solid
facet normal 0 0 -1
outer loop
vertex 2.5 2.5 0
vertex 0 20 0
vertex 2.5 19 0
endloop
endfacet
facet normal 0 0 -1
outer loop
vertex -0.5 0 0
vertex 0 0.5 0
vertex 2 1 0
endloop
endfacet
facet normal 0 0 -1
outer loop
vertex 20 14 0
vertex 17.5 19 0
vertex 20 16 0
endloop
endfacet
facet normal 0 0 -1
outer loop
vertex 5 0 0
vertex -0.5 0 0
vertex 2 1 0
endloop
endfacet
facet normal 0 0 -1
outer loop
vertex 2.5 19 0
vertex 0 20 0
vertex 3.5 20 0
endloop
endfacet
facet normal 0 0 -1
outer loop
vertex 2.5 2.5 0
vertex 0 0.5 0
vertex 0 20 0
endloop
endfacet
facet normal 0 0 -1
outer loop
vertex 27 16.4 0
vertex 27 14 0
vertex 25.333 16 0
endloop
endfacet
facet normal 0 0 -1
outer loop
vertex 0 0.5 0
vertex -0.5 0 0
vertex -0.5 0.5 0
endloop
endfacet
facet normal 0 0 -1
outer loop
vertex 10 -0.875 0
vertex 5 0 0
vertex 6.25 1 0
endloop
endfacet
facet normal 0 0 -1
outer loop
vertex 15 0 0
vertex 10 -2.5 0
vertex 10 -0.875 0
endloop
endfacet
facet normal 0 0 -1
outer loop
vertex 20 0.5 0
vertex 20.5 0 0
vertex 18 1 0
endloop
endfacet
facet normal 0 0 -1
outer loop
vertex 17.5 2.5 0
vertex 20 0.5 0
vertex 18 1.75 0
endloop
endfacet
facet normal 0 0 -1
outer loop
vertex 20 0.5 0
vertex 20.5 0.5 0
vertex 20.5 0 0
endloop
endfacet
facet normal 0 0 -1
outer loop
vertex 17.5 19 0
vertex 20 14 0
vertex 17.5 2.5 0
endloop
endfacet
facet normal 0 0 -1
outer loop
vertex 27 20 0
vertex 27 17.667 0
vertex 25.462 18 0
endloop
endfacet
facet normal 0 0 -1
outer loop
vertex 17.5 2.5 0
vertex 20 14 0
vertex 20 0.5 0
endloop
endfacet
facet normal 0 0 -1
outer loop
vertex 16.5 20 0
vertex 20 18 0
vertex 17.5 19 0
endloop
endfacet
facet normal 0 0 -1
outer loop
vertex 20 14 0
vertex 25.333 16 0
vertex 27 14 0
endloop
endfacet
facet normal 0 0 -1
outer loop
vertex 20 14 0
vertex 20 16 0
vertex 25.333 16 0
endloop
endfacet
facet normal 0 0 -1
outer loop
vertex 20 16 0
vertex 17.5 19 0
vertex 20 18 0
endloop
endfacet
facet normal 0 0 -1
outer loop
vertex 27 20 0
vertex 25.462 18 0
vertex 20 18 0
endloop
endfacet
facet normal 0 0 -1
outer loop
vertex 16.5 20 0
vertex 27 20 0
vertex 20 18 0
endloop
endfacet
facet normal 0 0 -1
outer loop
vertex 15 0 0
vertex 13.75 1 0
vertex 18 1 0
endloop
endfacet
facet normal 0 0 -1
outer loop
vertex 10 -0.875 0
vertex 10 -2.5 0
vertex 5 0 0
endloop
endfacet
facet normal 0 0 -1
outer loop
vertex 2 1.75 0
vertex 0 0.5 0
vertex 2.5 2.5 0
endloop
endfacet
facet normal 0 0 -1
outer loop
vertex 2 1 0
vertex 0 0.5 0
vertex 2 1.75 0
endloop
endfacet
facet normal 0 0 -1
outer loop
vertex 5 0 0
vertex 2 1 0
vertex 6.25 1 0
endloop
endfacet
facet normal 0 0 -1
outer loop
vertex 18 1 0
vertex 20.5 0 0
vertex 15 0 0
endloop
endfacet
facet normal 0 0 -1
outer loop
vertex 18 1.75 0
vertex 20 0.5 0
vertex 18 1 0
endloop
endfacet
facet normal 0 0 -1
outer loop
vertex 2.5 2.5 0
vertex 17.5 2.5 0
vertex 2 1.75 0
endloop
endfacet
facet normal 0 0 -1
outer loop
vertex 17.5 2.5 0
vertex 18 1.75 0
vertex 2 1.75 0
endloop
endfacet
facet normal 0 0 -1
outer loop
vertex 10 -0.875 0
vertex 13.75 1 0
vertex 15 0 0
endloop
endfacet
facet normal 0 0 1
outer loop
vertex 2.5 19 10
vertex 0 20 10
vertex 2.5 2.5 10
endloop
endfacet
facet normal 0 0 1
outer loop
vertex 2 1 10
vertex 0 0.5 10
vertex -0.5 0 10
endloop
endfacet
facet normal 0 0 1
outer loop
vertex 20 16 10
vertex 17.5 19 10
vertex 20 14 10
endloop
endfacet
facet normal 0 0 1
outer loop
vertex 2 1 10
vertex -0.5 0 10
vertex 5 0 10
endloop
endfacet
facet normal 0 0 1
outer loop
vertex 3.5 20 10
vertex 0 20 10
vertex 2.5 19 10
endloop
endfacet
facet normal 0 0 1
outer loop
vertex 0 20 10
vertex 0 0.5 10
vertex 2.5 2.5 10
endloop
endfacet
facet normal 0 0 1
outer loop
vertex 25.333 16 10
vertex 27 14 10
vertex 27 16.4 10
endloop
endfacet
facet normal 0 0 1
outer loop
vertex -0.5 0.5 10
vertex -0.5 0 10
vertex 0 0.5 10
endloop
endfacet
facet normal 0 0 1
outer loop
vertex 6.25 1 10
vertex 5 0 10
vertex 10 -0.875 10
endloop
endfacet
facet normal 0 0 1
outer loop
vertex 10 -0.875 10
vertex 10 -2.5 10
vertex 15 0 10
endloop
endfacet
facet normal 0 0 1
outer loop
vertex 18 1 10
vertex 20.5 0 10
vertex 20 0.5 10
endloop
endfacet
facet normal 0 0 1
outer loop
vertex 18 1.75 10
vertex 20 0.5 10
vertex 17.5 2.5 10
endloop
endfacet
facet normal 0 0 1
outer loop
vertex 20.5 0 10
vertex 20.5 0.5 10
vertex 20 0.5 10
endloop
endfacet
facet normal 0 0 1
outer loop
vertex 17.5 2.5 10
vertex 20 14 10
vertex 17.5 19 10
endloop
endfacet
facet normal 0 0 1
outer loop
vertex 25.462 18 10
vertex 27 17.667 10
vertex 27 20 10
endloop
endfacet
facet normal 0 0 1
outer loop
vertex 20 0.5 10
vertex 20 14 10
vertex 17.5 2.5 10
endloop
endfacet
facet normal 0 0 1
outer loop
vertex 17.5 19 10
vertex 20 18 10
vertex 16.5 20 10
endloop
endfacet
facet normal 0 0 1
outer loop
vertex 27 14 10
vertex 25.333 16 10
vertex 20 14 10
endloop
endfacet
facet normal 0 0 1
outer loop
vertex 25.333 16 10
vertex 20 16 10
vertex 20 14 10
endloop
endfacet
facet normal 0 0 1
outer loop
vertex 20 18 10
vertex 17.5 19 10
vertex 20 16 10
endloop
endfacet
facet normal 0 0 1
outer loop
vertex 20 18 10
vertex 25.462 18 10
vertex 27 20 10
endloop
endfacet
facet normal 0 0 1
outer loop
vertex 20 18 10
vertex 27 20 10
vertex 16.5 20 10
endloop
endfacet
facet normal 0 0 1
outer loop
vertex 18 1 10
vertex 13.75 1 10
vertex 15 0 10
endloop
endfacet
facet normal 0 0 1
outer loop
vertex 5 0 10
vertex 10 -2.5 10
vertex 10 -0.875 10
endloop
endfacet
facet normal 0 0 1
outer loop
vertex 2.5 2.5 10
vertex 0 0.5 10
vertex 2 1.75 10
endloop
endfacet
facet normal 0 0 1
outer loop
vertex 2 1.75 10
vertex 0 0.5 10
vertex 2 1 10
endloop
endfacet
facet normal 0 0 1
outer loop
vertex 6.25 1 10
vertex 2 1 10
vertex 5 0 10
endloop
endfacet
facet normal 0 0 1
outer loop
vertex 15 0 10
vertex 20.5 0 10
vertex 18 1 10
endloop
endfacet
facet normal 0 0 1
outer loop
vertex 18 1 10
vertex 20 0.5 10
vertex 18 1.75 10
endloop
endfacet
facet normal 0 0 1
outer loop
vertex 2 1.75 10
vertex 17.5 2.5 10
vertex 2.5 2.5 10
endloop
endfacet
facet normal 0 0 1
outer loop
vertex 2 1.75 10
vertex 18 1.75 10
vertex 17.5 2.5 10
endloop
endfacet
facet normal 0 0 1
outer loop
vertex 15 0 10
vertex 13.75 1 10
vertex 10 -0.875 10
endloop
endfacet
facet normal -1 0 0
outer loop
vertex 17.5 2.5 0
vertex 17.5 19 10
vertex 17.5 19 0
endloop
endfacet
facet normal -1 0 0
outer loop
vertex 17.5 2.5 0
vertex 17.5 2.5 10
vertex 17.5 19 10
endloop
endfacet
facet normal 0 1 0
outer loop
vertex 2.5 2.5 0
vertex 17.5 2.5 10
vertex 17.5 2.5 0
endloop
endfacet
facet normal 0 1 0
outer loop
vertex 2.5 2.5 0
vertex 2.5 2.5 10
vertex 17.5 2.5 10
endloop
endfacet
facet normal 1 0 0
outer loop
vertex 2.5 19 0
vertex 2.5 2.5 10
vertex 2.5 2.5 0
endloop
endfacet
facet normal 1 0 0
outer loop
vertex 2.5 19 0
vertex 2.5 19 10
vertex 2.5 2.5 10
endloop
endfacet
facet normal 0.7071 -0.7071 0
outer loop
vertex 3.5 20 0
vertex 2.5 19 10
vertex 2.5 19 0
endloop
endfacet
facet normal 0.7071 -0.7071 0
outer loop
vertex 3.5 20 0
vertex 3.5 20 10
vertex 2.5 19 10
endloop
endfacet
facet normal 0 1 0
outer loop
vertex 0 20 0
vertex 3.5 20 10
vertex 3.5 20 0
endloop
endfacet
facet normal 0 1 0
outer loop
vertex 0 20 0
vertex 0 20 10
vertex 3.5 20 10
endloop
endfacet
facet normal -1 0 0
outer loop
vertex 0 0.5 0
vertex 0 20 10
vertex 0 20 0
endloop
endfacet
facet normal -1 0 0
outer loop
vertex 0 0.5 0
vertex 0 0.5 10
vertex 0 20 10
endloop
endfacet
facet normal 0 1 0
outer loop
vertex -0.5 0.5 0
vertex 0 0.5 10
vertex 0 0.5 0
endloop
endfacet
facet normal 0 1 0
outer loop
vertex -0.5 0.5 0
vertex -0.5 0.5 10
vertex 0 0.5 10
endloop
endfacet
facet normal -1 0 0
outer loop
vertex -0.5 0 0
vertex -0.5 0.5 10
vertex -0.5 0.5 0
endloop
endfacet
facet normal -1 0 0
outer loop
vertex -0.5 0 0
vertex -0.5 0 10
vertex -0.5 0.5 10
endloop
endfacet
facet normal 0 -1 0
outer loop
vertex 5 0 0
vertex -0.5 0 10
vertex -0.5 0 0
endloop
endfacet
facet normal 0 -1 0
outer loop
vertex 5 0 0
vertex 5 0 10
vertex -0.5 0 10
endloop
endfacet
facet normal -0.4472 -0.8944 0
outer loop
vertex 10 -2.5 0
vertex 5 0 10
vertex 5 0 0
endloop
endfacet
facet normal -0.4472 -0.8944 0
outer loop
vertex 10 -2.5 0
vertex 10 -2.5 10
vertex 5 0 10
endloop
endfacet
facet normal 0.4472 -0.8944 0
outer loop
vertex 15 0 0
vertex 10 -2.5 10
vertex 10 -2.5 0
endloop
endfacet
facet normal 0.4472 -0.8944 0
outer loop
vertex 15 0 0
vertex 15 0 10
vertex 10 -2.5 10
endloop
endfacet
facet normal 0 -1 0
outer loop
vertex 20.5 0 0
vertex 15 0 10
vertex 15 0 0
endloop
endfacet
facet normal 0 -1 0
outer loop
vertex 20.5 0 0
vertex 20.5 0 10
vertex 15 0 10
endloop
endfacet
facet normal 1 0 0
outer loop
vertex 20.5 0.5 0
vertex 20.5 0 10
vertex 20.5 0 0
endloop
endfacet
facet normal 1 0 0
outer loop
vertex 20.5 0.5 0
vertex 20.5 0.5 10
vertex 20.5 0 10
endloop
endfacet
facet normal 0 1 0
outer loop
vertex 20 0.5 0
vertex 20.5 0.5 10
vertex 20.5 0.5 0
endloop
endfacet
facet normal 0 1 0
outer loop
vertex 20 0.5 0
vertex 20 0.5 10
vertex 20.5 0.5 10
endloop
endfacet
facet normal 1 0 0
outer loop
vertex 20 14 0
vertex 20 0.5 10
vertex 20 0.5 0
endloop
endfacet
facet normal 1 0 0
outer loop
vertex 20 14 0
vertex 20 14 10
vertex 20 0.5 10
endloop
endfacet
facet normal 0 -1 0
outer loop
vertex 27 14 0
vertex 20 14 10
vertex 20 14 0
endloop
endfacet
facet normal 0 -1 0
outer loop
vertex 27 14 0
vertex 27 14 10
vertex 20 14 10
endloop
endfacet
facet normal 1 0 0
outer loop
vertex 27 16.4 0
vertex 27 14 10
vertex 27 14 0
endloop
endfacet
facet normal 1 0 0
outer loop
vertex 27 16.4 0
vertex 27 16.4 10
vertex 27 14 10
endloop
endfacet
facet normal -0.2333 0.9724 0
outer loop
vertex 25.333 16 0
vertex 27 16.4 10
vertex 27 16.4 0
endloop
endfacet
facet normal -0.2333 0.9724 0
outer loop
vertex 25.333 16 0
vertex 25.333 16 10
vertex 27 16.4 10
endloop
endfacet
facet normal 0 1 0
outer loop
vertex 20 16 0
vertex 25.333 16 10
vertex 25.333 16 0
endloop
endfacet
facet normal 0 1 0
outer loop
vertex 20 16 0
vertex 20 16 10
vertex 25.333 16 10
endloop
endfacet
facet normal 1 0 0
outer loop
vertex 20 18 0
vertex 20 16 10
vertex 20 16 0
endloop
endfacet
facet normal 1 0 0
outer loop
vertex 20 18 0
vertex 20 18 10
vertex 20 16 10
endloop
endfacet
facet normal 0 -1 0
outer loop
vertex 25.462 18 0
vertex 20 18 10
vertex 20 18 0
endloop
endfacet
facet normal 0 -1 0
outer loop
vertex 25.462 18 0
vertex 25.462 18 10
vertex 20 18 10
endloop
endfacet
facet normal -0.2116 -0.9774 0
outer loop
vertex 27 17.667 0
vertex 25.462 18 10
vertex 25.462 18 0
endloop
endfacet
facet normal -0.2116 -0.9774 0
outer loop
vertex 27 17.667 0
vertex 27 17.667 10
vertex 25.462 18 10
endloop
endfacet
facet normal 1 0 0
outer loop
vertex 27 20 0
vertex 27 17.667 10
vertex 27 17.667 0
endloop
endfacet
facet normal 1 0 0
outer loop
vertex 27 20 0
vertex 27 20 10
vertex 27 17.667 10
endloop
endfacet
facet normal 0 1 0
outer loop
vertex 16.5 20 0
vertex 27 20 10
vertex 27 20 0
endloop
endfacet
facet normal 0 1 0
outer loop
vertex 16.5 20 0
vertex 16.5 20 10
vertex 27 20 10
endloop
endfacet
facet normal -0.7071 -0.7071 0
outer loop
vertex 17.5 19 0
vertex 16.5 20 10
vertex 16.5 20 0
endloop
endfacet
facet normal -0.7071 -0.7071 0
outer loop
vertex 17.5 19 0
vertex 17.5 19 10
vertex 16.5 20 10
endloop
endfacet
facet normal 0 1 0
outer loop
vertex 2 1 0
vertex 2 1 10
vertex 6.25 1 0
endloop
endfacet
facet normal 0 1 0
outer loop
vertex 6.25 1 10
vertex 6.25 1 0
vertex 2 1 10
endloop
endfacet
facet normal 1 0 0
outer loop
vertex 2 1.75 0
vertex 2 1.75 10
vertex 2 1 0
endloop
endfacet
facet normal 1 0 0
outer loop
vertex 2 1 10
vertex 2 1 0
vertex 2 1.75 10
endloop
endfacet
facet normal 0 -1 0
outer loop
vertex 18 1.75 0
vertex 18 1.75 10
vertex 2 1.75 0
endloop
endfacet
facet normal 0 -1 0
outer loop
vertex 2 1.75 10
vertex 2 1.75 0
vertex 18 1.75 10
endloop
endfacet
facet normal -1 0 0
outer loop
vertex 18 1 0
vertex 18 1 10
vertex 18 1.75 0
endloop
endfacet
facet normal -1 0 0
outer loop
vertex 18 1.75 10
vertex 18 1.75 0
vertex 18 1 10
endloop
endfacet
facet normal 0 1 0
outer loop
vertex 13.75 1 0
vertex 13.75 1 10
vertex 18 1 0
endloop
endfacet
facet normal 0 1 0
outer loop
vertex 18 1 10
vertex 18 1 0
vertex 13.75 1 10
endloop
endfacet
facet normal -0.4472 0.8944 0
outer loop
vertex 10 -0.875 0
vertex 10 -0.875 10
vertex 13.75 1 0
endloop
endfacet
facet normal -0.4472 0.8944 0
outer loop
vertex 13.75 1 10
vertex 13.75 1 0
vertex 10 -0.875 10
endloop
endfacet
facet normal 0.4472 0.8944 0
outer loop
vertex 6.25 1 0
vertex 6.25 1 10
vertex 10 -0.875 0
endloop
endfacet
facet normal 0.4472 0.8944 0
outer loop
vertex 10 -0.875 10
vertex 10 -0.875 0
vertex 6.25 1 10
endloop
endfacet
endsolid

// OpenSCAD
/* (C) Copyright 2017 by Thomas R. Koll
 * LED strip holder is a 3D model released under the Creative Commons Attribution Share Alike license
*/

spacing_of_clip_legs = 15;
height = 20;
extrude_to_width = 10;
clip_thickness = 5;
// set to true if you want some decorative cut-out in the top
cut_into_top = true; // [false, true]

// width is the strip
wires = 3;
// diameter of a single wire
wire_diameter = 2;

q = wire_diameter * (wires + 0.5);
k = wire_diameter;

/* [Hidden] */
t = clip_thickness;
w = spacing_of_clip_legs + clip_thickness;

module top_decoration(w, t) {
    // overhang on the top
    translate([-0.5, 0]) square([w + 1, t/5]);
    // pyramid on the top
    polygon([[w/4, 0], [w/2, -w/8], [w * 0.75, 0]]);
}

module bottom_decoration(w, t) {
    f = t/5;
    translate([t/2, 0]) polygon([[0, 0], [f, 0], [0, -f]]);
    translate([w -t/2, 0]) polygon([[0, 0], [-f, 0], [0, -f]]);
}

linear_extrude(extrude_to_width) union() {
    difference() {
        union() {
            top_decoration(w, t/2);
            difference() {
                square([w, height]); // base body
                translate([t/2, t/2]) {
                    square([w-t, height]);
                }
            }
        }
        s = 0.25;
        translate([w * s/2, t/5]) top_decoration(w * (1-s), t * (1-s));
    }
    translate([0, height]) bottom_decoration(w, t);
    
    // clip to hold the cable
    translate([w, height - 3 * k]) difference() {
        square([q, k * 3]);
        difference() {
            translate([0, k]) square([q, k]);
            polygon([[q, k], [q, k * 1.2], [q - k / 1.2, k]]);
            translate([0, k]) polygon([[q, k], [q, k / 1.2], [q - k / 1.3, k]]);
        }
    }
}
